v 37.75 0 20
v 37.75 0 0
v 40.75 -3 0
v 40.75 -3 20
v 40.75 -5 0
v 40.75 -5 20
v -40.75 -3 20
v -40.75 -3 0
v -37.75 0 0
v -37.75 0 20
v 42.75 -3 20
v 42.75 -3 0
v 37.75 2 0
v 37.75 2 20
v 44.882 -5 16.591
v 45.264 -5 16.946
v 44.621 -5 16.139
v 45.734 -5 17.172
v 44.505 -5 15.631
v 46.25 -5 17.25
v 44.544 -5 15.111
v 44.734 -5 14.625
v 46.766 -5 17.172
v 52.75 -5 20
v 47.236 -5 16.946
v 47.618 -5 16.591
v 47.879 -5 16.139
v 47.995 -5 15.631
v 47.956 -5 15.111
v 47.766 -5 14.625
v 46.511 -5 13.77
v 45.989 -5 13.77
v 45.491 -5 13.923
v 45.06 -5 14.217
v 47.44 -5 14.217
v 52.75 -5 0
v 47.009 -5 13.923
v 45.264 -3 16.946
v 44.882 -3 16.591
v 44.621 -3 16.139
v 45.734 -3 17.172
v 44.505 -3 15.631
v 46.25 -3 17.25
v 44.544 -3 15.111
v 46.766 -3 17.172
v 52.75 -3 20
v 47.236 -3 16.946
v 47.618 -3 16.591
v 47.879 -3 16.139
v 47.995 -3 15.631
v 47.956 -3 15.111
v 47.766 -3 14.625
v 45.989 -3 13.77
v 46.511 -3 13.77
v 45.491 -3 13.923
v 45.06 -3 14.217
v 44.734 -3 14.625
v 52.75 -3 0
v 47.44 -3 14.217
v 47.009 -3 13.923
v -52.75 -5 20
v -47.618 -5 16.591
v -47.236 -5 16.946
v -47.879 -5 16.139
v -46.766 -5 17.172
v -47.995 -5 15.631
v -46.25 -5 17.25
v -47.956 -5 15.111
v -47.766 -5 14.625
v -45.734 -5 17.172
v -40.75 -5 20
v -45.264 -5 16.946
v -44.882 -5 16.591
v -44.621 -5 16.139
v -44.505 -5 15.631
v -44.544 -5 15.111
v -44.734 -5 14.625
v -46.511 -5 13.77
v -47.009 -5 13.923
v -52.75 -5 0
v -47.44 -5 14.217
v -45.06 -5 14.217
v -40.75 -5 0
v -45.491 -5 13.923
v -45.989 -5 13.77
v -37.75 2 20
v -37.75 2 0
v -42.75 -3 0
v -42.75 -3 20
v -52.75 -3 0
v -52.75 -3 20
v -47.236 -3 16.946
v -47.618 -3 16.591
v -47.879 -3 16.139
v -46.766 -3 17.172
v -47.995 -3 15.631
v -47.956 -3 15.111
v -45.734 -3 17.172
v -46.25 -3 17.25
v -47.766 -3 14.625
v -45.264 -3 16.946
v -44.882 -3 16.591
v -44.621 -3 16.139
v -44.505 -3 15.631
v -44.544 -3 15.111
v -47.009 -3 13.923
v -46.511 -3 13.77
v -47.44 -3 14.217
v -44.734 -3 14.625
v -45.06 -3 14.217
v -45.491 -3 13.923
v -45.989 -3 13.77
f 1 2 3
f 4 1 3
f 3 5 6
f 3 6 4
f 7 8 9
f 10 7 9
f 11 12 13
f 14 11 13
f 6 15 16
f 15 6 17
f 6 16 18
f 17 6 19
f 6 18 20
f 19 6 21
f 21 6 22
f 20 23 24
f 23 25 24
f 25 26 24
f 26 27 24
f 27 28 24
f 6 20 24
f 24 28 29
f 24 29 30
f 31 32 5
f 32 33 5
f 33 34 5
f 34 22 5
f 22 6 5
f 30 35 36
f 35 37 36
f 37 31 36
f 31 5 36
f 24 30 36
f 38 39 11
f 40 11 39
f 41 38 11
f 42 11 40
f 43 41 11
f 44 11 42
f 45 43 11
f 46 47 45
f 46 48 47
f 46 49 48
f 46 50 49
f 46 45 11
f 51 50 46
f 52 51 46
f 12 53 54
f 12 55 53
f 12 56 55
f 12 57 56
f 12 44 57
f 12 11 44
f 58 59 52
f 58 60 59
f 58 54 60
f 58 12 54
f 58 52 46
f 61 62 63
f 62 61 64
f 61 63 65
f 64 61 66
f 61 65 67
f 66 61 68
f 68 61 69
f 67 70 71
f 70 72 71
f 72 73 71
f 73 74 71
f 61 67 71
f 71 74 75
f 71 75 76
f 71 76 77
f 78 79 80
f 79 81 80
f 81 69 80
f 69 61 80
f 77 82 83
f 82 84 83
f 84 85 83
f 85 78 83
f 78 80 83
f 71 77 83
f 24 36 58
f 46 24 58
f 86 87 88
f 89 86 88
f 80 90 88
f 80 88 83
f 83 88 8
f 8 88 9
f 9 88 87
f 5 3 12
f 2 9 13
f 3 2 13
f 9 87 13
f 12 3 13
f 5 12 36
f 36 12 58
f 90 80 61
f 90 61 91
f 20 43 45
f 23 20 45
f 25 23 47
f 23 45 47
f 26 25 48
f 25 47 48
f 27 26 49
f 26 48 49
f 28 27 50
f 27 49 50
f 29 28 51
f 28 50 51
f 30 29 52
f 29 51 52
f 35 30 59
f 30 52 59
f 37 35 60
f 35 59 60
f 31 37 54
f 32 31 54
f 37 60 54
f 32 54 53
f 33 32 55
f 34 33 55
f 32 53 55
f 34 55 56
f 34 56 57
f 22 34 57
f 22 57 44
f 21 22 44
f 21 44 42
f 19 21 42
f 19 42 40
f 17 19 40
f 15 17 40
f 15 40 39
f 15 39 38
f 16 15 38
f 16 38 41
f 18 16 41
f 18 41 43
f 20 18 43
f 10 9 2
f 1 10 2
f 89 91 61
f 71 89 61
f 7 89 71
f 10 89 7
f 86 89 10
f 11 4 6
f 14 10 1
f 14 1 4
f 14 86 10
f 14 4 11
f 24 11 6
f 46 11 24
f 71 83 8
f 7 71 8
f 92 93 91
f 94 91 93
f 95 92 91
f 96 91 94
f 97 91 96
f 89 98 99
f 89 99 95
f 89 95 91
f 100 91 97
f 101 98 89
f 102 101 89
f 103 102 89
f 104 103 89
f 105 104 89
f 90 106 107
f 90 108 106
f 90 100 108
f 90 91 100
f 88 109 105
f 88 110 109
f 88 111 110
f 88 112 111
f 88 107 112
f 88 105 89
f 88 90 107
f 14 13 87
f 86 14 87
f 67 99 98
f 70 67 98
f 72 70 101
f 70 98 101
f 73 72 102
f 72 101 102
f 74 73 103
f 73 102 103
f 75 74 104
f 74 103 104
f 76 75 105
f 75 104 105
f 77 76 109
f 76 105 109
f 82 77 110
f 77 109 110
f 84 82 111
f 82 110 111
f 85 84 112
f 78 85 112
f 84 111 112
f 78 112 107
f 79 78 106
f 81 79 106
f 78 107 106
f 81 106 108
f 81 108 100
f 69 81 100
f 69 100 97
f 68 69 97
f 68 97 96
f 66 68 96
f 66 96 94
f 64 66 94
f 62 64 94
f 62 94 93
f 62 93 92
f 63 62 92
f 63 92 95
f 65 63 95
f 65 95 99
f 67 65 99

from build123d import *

# Parameters (mm, degrees)
ESQUISSE4_W             = 12
ESQUISSE4_H             = 2
ESQUISSE4_W_2           = 37.75
BOSS_EXTRU_2_DEPTH      = 20
ESQUISSE5_R             = 1.75
ENL_V_MAT_EXTRU_1_DEPTH = 57.846833685


with BuildPart() as part:
    # Esquisse4 → Boss.-Extru.2 (new body)
    with BuildSketch(Plane.XY):
        with Locations((-46.75, -4)):
            Rectangle(ESQUISSE4_W, ESQUISSE4_H)
        Polygon((-40.75, -3), (-37.75, 0), (-37.75, 2), (-42.75, -3), align=None)
        with Locations((-18.875, 1)):
            Rectangle(ESQUISSE4_W_2, ESQUISSE4_H)
        with Locations((18.875, 1)):
            Rectangle(ESQUISSE4_W_2, ESQUISSE4_H)
        Polygon((37.75, 2), (37.75, 0), (40.75, -3), (42.75, -3), align=None)
        with Locations((46.75, -4)):
            Rectangle(ESQUISSE4_W, ESQUISSE4_H)
    extrude(amount=BOSS_EXTRU_2_DEPTH)

    # Esquisse5 → Enlèv. mat.-Extru.1 (cut, through all)
    with BuildSketch(Plane(origin=(0, 2, 0), x_dir=(1, 0, 0), z_dir=(0, 1, 0))):
        with Locations(Location((-46.25, -15.5, 0), (0, 0, 270))):
            Circle(ESQUISSE5_R)
        with Locations(Location((46.25, -15.5, 0), (0, 0, 270))):
            Circle(ESQUISSE5_R)
    extrude(amount=-ENL_V_MAT_EXTRU_1_DEPTH, mode=Mode.SUBTRACT)


solid = part.part
